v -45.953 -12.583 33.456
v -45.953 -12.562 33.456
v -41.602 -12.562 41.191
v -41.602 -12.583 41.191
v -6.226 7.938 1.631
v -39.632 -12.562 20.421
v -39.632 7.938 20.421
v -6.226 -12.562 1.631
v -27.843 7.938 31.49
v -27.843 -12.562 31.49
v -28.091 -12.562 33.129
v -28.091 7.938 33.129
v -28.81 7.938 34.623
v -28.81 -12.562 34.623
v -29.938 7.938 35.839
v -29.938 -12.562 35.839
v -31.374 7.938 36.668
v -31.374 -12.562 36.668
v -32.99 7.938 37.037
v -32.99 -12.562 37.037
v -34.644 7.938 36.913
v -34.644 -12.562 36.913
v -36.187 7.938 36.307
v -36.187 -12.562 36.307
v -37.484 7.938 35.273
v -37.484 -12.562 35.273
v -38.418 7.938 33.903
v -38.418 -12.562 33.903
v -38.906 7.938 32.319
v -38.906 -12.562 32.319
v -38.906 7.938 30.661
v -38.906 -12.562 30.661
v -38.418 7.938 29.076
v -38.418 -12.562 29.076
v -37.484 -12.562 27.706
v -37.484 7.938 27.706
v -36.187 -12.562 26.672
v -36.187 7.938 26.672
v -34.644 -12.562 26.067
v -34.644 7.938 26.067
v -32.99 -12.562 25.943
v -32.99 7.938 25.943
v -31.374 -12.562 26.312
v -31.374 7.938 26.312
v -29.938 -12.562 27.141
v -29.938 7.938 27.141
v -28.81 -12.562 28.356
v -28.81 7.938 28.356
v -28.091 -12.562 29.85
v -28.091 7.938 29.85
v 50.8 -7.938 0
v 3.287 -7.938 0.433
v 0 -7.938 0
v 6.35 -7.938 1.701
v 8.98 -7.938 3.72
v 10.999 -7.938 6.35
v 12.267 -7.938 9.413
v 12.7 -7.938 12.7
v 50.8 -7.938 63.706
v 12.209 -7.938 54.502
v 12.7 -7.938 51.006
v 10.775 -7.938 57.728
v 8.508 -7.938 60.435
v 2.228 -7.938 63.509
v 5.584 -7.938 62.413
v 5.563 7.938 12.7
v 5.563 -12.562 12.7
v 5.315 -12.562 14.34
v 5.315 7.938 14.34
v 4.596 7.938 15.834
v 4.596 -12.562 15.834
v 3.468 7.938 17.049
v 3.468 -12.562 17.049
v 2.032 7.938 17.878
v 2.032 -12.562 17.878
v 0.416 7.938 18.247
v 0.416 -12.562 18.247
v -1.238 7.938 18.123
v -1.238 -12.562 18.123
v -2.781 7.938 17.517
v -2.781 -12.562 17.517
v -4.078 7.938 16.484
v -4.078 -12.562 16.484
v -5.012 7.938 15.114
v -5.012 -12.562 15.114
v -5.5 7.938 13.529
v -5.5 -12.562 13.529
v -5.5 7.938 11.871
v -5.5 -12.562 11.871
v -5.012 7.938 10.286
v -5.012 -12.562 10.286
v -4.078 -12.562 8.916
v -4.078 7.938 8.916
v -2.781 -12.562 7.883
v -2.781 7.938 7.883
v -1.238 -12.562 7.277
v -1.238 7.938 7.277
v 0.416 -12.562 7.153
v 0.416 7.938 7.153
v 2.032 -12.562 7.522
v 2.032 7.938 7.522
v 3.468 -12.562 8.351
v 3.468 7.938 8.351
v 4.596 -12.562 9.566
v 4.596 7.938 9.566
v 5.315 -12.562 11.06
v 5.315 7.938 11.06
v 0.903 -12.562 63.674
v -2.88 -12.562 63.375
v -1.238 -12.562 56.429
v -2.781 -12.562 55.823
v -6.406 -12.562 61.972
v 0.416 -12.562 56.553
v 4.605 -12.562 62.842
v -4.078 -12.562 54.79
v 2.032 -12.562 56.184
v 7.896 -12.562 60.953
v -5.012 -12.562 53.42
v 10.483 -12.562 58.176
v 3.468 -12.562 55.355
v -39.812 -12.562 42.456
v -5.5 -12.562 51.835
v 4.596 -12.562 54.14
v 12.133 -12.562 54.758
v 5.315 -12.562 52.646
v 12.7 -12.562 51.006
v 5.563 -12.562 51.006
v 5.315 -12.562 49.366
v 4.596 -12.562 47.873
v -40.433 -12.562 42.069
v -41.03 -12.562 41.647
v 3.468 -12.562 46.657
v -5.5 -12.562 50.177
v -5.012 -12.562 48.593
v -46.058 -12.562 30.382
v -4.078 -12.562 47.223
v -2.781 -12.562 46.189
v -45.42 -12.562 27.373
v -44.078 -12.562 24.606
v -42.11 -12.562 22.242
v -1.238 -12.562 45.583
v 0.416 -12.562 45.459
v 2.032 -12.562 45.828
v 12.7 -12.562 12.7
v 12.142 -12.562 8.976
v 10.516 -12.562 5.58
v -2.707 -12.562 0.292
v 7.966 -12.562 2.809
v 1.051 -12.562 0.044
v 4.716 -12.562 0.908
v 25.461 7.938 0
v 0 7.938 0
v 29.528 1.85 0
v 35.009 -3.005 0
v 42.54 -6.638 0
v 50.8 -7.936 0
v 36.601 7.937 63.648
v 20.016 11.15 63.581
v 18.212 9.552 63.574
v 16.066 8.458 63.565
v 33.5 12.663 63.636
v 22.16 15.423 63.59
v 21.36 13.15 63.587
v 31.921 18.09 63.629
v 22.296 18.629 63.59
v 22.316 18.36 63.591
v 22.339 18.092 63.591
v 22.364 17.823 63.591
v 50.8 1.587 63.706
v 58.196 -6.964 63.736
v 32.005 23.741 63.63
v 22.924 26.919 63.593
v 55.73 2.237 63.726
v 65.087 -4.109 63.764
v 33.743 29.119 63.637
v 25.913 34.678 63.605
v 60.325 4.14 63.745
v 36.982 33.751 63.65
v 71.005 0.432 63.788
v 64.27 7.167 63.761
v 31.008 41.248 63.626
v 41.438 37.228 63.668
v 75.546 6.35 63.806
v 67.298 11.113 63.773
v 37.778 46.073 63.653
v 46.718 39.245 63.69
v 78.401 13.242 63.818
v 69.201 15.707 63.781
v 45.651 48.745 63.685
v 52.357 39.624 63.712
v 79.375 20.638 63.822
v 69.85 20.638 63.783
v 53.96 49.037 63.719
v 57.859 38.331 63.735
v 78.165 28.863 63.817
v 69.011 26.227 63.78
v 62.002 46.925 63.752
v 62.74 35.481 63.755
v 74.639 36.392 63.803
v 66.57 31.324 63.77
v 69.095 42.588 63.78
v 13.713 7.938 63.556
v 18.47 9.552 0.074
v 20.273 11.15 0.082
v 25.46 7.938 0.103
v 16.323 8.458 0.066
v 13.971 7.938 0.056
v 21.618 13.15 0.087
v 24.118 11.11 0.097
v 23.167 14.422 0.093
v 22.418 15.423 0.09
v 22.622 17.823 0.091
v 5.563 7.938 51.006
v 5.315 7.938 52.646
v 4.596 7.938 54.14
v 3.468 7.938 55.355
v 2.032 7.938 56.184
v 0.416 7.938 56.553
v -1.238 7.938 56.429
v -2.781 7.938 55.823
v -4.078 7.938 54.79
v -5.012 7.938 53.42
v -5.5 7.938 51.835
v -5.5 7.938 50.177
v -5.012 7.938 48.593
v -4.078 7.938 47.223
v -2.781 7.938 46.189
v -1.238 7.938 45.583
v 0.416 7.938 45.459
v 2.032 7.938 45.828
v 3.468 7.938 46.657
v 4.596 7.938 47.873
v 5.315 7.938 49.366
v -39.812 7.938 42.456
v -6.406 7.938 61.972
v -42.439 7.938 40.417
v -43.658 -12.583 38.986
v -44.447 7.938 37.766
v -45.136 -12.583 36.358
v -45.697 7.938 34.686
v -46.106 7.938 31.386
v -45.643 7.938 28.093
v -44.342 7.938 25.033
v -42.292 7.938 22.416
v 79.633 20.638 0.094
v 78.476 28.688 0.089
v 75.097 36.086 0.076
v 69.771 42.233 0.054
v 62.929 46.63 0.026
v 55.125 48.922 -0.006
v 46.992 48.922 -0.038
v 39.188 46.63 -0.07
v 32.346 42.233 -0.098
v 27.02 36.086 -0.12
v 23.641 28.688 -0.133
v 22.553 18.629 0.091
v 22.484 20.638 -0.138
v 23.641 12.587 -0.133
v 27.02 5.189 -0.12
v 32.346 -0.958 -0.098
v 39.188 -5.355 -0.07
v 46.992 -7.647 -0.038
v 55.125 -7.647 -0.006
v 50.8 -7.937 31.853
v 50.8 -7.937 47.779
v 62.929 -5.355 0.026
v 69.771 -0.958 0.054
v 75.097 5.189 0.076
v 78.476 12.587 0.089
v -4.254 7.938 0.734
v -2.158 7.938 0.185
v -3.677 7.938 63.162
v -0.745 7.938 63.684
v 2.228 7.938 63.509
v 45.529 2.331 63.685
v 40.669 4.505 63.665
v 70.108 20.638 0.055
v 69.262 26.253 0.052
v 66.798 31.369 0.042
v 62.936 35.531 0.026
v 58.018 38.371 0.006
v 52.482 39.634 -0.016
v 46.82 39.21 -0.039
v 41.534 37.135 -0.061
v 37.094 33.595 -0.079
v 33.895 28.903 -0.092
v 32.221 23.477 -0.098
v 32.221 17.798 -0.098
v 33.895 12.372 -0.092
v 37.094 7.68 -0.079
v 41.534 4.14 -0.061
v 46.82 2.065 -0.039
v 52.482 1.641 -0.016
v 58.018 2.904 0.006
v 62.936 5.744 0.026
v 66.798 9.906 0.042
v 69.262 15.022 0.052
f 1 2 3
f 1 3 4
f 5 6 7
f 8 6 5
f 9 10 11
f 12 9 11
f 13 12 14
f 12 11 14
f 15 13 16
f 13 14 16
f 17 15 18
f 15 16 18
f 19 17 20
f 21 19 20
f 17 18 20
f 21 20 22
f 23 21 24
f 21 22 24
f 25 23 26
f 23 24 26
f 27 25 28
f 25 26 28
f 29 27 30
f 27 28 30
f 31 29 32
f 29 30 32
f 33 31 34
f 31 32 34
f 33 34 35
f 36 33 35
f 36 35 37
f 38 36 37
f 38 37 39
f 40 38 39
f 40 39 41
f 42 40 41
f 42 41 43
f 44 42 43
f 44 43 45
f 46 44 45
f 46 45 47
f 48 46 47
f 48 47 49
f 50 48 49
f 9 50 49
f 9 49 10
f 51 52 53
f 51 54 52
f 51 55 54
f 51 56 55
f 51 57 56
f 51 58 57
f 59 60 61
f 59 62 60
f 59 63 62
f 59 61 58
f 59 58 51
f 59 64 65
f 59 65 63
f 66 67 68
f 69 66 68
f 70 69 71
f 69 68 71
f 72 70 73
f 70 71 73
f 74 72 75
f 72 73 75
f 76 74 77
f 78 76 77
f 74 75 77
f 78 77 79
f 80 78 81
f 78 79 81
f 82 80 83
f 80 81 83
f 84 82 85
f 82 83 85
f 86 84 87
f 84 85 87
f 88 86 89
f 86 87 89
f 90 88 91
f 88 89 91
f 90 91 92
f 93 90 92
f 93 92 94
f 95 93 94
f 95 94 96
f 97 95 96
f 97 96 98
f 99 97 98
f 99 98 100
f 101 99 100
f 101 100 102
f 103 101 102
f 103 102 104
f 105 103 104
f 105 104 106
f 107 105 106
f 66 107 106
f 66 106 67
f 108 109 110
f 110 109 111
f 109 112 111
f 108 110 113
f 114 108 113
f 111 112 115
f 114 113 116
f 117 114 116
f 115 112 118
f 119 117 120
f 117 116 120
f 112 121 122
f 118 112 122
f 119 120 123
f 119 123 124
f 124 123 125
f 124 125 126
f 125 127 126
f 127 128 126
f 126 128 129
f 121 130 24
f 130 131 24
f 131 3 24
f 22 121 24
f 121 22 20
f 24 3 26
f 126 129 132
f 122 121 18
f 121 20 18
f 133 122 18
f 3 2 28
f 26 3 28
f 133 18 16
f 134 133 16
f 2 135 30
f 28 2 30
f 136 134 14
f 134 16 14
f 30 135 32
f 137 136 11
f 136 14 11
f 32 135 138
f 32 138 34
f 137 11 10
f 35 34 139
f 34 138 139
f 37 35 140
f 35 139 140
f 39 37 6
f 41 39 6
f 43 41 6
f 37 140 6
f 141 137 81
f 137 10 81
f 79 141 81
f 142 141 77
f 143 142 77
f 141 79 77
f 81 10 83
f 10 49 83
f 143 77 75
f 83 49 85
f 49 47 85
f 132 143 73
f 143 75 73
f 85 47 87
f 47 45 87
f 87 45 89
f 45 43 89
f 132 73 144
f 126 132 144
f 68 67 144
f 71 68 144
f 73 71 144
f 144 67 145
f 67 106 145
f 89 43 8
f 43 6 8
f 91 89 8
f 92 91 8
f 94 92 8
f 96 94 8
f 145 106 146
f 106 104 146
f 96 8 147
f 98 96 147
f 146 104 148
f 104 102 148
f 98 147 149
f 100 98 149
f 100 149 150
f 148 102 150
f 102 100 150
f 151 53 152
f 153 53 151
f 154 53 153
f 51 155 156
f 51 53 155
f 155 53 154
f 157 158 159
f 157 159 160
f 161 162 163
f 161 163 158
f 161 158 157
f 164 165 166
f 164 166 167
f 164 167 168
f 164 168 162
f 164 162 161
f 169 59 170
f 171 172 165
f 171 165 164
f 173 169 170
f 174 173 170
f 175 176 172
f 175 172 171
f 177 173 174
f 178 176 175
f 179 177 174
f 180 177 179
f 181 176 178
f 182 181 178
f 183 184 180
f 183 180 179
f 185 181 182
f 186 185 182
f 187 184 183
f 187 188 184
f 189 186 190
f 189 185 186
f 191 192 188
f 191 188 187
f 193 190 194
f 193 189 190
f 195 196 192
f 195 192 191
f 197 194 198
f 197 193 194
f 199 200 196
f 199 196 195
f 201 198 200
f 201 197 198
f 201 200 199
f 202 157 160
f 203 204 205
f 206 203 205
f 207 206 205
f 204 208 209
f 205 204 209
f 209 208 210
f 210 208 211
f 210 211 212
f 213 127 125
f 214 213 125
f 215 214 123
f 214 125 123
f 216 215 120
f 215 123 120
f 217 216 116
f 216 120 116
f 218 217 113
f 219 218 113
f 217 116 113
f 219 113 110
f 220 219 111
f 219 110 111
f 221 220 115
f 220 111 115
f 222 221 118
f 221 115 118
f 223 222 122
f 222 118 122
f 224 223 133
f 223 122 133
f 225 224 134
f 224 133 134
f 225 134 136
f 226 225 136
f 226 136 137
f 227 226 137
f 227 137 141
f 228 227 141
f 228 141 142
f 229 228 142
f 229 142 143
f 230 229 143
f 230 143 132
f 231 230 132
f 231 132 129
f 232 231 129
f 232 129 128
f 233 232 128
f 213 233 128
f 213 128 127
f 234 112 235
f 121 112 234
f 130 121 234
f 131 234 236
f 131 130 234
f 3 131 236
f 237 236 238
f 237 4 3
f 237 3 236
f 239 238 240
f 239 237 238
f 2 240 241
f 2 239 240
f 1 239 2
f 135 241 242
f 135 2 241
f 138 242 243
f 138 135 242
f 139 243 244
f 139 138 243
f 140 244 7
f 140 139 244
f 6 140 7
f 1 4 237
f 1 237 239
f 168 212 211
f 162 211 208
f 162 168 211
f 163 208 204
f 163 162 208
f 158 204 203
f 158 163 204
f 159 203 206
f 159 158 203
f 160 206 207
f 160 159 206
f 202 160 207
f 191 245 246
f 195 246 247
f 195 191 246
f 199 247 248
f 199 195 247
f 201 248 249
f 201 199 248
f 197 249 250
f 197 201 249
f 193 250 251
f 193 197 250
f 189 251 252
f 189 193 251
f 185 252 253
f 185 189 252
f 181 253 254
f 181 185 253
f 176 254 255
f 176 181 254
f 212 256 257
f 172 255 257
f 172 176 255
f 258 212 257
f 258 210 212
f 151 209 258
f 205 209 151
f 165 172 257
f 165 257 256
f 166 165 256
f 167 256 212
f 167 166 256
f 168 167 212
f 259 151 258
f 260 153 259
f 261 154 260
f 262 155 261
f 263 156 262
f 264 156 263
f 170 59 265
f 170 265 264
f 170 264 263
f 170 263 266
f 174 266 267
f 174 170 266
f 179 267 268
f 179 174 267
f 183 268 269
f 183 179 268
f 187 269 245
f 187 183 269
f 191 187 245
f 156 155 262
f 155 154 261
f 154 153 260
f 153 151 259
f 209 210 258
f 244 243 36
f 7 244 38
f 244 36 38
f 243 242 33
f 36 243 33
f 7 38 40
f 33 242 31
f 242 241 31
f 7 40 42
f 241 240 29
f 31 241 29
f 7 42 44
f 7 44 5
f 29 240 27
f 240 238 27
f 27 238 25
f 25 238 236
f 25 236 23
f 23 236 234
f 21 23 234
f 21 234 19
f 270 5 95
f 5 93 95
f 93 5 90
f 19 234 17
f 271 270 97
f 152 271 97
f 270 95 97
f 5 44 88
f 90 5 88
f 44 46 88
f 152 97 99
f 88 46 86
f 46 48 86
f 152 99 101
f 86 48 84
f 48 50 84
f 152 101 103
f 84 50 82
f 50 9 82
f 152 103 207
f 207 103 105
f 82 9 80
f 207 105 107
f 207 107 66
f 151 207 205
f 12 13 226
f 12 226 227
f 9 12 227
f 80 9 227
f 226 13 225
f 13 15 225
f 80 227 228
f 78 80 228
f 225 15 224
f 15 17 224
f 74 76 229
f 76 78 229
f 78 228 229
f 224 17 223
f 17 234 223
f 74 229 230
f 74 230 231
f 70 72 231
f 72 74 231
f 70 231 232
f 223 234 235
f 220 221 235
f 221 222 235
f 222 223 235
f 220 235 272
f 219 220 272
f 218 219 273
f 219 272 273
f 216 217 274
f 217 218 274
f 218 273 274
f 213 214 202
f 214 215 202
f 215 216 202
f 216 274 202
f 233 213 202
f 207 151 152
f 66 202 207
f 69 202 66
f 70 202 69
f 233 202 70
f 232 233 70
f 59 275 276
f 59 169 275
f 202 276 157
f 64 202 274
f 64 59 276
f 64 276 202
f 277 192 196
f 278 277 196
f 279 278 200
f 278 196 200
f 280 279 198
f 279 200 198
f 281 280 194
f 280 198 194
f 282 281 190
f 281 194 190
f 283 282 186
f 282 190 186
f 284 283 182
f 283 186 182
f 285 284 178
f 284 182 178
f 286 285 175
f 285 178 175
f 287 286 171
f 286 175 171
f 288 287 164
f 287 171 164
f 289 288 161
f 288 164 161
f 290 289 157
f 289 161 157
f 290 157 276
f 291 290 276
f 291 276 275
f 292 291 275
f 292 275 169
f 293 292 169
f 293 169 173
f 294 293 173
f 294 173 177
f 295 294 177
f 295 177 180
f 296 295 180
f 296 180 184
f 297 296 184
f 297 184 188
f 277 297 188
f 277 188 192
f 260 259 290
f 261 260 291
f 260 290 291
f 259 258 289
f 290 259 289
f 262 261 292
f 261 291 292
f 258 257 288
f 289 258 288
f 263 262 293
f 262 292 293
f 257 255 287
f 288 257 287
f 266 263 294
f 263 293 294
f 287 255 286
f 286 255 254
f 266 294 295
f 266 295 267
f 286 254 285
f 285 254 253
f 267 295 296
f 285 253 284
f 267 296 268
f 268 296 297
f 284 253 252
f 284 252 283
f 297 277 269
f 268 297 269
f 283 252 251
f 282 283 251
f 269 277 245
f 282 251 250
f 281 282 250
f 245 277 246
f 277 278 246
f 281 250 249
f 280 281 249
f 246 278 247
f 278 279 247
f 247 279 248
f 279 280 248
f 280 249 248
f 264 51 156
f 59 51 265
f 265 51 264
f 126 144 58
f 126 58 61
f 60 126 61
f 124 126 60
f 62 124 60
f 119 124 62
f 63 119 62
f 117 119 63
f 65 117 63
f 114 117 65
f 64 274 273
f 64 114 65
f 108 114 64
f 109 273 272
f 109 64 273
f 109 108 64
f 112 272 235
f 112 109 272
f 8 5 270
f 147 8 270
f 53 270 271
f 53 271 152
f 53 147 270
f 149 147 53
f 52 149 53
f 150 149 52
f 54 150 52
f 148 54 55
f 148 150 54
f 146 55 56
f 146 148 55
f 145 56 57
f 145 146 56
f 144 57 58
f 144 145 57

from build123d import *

# Parameters (mm, degrees)
F1_DEPTH  = 7.9375
F3_DEPTH  = 15.875
F4_W      = 71.9558009878
F4_H      = 13.6753677544
F5_DEPTH  = 87.884
F7_DEPTH  = 84.582
F8_R      = 5.5626
F9_DEPTH  = 25.4
F10_R     = 28.575
F11_DEPTH = 63.7286
F12_R     = 19.05
F13_DEPTH = 95.758
F15_DEPTH = 63.5


with BuildPart() as f1:
    # F0 (on Front) → F1 (new body, symmetric)
    with BuildSketch(Plane.XZ):
        Polygon((0, 63.5), (0, 0), (50.8, 0), (50.8, 63.7060776353), align=None)
    extrude(amount=F1_DEPTH, both=True)

    # F2 (on face) → F3 (join, symmetric)
    with BuildSketch(Plane.XZ.offset(7.9375)):
        with BuildLine():
            ThreePointArc((-39.632043346, 20.4206049765), (-26.9943232846, 20.5270910991), (-20.706004086, 31.4897709403))
            ThreePointArc((-20.706004086, 31.4897709403), (-27.0842562365, 42.5045566453), (-39.8123826888, 42.4555501282))
            ThreePointArc((-39.8123826888, 42.4555501282), (-46.1055787727, 31.3858345367), (-39.632043346, 20.4206049765))
        make_face()
        with BuildLine():
            ThreePointArc((-39.8123826888, 42.4555501282), (-27.0842562365, 42.5045566453), (-20.706004086, 31.4897709403))
            ThreePointArc((-20.706004086, 31.4897709403), (-26.9943232846, 20.5270910991), (-39.632043346, 20.4206049765))
            Line((-39.632043346, 20.4206049765), (-6.22603926, 1.6308340362))
            ThreePointArc((-6.22603926, 1.6308340362), (-6.4116808014, 23.6626798412), (12.7, 12.7))
            Line((12.7, 12.7), (12.7, 51.0060776353))
            ThreePointArc((12.7, 51.0060776353), (-6.3217478495, 39.9912919303), (-6.4063786028, 61.9718568232))
            Line((-6.4063786028, 61.9718568232), (-39.8123826888, 42.4555501282))
        make_face()
        with BuildLine():
            ThreePointArc((12.7, 51.0060776353), (6.3217478495, 62.0208633403), (-6.4063786028, 61.9718568232))
            ThreePointArc((-6.4063786028, 61.9718568232), (-6.3217478495, 39.9912919303), (12.7, 51.0060776353))
        make_face()
        with BuildLine():
            ThreePointArc((12.7, 12.7), (-6.4116808014, 23.6626798412), (-6.22603926, 1.6308340362))
            ThreePointArc((-6.22603926, 1.6308340362), (6.4116808014, 1.7373201588), (12.7, 12.7))
        make_face()
    extrude(amount=F3_DEPTH, both=True)

    # F4 (on face) → F5 (cut)
    with BuildSketch(Plane(origin=(-0.7994989556, 0, -1.4214151659), x_dir=(0.8715878712, 0, -0.4902393118), z_dir=(-0.4902393118, 0, -0.8715878712))):
        with Locations((-20.4755323939, 19.3995043051)):
            Rectangle(F4_W, F4_H)
    extrude(amount=-F5_DEPTH, mode=Mode.SUBTRACT)

    # F6 (on Top) → F7 (cut)
    with BuildSketch(Plane.XY):
        Polygon((-39.6329276264, -12.583178468), (-41.4357371628, -12.583178468), (-46.0986830294, -12.583178468), (-46.0986830294, -26.8648453057), (-39.6329276264, -26.8648453057), align=None)
    extrude(amount=F7_DEPTH, mode=Mode.SUBTRACT)

    # F8 (on face) → F9 (cut)
    with BuildSketch(Plane.XZ.offset(12.5618204279)):
        with Locations((0, 51.0060776353)):
            Circle(F8_R)
        with Locations((0, 12.7)):
            Circle(F8_R)
        with Locations((-33.406004086, 31.4897709403)):
            Circle(F8_R)
    extrude(amount=-F9_DEPTH, mode=Mode.SUBTRACT)

    # F10 (on face) → F11 (join)
    with BuildSketch(Plane(origin=(-0.2575928051, 0, 63.4989550371), x_dir=(0.9999917719, 0, 0.004056613), z_dir=(-0.004056613, 0, 0.9999917719))):
        with Locations((51.0580129149, 20.6375)):
            Circle(F10_R)
    extrude(amount=-F11_DEPTH)

    # F12 (on face) → F13 (cut)
    with BuildSketch(Plane(origin=(-0.2575928051, 0, 63.4989550371), x_dir=(0.9999917719, 0, 0.004056613), z_dir=(-0.004056613, 0, 0.9999917719))):
        with Locations((51.0580129149, 20.6375)):
            Circle(F12_R)
    extrude(amount=-F13_DEPTH, mode=Mode.SUBTRACT)

    # F14 (on face) → F15 (join)
    with BuildSketch(Plane(origin=(-0.2575928051, 0, 63.4989550371), x_dir=(0.9999917719, 0, 0.004056613), z_dir=(-0.004056613, 0, 0.9999917719))):
        with BuildLine():
            Line((13.9709103513, 7.9375), (12.2397709638, 7.9375))
            ThreePointArc((12.2397709638, 7.9375), (13.1053406575, 7.8980898133), (13.9709103513, 7.9375))
        make_face()
        with BuildLine():
            ThreePointArc((22.5536784489, 18.6291320929), (20.5331210195, 11.4603971418), (13.9709103513, 7.9375))
            Line((13.9709103513, 7.9375), (25.4603445641, 7.9375))
            Line((25.4603445641, 7.9375), (22.5536784489, 18.6291320929))
        make_face()
    extrude(amount=-F15_DEPTH)


solid = f1.part
